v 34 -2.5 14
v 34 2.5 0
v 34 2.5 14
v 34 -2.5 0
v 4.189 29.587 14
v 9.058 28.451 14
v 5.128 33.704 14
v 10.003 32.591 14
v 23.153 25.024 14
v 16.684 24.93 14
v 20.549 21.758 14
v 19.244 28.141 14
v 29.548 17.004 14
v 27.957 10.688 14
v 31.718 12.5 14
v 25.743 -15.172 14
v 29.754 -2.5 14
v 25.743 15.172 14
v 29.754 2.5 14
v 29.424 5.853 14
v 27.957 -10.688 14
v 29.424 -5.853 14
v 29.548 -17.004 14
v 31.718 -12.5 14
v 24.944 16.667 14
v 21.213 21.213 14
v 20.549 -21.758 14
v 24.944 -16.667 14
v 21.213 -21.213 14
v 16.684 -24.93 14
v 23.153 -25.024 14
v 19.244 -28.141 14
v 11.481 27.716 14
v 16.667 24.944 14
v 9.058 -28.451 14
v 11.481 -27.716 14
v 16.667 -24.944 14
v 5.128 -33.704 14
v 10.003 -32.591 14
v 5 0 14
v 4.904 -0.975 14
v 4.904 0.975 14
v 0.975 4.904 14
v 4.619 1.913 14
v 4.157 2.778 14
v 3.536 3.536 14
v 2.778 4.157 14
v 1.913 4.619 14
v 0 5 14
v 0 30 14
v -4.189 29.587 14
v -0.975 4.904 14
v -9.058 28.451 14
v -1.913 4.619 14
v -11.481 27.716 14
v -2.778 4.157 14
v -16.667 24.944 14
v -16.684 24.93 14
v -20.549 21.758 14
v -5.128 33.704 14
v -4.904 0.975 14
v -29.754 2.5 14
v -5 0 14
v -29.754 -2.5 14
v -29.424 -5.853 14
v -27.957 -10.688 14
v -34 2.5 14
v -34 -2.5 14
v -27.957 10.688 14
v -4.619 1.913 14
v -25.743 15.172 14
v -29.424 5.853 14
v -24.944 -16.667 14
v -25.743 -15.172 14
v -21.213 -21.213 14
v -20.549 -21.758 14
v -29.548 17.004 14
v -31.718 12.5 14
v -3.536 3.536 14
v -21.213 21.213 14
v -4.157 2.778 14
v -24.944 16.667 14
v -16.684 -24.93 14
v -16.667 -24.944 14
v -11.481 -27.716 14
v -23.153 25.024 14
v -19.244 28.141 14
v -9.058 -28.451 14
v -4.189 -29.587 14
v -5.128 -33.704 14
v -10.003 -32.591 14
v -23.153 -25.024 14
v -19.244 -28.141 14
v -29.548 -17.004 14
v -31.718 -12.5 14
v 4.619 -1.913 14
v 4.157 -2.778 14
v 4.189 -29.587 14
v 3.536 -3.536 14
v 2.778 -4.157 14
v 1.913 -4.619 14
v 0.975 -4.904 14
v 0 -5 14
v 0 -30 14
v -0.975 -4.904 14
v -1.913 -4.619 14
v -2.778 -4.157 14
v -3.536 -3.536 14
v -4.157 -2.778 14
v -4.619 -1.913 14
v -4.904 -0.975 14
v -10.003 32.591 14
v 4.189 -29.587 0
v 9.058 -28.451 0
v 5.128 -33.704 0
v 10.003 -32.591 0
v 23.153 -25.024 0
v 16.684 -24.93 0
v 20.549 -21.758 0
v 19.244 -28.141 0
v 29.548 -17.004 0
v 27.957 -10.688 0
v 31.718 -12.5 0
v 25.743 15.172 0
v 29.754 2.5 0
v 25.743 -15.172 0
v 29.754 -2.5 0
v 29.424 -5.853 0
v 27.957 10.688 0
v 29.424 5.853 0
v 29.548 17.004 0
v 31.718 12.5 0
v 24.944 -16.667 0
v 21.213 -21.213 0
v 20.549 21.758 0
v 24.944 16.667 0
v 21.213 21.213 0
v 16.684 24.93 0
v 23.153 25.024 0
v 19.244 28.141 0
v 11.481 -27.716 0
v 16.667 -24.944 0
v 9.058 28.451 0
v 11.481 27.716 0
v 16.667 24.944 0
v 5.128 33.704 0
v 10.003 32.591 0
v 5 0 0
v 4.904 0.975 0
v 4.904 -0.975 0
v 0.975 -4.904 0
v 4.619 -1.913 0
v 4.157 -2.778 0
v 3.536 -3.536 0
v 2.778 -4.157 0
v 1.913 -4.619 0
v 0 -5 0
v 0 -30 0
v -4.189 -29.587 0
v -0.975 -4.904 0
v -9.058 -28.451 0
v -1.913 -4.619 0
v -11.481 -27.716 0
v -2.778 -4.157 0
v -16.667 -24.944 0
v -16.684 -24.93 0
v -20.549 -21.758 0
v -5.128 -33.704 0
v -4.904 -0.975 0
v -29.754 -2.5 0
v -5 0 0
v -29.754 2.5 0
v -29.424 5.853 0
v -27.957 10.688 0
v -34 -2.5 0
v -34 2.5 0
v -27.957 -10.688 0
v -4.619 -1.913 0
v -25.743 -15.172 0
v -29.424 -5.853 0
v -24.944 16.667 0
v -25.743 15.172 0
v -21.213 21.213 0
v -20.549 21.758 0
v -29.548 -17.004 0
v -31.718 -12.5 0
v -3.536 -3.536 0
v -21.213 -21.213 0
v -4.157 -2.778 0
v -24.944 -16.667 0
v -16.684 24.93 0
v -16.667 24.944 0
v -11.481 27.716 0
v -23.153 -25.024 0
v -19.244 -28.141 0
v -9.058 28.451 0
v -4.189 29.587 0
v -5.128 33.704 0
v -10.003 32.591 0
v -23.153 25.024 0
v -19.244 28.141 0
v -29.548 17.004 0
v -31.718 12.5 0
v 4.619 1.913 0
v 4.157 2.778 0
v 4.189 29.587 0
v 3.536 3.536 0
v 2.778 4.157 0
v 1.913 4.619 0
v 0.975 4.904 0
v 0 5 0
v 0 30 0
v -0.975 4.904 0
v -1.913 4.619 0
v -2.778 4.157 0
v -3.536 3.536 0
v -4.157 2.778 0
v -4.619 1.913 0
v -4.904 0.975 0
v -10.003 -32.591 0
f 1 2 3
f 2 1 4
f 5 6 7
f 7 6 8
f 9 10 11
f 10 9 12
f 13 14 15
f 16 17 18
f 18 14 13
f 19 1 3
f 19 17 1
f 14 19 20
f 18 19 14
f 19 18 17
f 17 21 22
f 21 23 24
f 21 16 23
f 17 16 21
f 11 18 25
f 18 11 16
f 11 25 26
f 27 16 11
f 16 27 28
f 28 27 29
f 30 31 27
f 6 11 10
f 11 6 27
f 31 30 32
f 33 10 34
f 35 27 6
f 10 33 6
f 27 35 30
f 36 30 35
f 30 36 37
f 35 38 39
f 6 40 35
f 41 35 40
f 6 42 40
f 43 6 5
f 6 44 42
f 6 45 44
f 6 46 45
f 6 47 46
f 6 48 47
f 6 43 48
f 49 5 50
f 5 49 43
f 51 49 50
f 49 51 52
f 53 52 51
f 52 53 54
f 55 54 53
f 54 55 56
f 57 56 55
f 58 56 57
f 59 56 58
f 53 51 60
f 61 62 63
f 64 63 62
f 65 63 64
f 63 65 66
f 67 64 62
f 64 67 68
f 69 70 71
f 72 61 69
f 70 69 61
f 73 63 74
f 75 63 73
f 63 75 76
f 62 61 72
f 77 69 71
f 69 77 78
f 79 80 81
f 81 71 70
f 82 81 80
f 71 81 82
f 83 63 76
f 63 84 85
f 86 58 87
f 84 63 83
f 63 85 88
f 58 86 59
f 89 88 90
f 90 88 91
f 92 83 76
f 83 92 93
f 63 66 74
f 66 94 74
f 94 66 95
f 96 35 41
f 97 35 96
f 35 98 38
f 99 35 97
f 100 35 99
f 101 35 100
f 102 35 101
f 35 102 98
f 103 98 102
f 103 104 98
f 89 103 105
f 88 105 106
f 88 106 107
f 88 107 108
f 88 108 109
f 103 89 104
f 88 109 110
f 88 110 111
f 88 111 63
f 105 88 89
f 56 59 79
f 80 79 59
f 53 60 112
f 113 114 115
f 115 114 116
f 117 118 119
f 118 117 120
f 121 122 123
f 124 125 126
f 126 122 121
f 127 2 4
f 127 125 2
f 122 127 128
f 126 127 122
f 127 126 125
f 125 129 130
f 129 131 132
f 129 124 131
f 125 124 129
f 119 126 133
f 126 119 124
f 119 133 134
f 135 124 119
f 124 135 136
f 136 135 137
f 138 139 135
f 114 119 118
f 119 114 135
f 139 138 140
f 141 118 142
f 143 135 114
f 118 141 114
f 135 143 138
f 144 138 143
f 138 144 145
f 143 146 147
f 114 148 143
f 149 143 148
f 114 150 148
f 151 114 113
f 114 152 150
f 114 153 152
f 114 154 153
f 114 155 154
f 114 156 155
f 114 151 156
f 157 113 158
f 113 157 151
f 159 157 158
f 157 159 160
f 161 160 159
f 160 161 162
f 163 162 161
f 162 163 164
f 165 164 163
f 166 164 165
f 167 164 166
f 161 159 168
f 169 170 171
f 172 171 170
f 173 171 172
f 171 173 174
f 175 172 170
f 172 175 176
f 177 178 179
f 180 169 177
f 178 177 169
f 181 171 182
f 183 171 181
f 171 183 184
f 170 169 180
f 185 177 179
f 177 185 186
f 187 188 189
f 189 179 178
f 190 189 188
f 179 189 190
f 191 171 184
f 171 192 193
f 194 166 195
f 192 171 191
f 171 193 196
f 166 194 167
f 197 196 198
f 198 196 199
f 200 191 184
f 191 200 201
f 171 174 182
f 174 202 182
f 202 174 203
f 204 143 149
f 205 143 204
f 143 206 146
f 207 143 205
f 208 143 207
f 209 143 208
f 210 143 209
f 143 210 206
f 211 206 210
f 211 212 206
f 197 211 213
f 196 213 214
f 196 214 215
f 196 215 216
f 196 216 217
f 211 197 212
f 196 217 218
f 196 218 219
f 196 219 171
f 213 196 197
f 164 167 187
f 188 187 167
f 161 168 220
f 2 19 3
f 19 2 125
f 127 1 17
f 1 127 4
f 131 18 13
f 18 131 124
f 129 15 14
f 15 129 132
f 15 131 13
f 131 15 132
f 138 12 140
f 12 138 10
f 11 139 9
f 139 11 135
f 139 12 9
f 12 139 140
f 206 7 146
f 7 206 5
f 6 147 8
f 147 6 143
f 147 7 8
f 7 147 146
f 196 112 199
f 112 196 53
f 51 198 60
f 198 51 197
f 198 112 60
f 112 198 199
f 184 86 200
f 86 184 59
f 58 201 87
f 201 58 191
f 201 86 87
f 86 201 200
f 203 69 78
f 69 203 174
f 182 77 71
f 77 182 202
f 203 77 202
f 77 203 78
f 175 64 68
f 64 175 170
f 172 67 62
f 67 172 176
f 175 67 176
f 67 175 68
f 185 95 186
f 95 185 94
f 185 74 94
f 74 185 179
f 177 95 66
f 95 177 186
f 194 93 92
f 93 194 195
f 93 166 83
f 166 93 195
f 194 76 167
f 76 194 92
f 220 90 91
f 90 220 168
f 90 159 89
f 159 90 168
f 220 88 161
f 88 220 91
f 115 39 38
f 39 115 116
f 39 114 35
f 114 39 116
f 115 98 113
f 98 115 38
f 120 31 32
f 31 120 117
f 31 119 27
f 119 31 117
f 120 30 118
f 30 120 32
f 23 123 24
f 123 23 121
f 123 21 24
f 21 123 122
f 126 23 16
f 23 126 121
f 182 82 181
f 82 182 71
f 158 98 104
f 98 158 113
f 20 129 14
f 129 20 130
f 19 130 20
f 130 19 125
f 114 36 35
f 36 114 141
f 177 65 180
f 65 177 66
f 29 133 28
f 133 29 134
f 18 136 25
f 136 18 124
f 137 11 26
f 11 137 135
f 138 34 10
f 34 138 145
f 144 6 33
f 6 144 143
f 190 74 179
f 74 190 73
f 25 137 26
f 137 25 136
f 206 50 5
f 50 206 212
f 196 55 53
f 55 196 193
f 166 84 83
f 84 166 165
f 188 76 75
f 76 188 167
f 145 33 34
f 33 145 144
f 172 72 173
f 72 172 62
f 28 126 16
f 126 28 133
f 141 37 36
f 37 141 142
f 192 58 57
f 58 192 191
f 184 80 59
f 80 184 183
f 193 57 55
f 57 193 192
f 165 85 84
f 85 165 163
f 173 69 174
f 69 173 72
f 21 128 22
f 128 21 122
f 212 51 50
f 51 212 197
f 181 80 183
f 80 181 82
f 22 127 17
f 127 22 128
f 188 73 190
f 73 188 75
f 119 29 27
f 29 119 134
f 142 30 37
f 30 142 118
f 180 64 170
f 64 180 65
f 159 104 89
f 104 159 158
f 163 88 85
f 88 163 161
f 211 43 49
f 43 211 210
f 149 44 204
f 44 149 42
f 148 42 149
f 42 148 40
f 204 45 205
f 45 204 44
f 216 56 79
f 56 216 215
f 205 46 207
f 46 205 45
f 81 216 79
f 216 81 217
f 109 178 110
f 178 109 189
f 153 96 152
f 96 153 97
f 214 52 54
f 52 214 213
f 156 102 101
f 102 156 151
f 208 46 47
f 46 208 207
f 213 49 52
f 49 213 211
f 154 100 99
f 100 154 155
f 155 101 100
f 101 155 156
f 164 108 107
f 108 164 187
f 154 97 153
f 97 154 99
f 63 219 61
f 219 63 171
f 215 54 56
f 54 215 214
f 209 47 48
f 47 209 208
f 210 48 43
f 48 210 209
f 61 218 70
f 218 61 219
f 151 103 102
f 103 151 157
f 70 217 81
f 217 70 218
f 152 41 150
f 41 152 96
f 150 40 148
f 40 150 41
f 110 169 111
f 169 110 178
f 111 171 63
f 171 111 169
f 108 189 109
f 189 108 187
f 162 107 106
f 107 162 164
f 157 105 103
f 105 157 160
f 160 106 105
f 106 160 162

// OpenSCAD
$fn = 32;

// ----------------------------------------------------------------------
// Spur blank: bored gear blank
// ----------------------------------------------------------------------

// --- parameters (mm) ---
disc_r = 30;              // blank root radius
disc_t = 14;              // blank thickness
n_teeth = 14;             // stub tooth count
tooth_w = 5;              // tooth width at the root
tooth_h = 4;              // tooth height above the root
bore_r = 5;               // central bore radius

out_r = disc_r + tooth_h;  // tip radius
bbox_x = 68.0;  // measured width over the teeth
bbox_y = 67.41;  // measured depth over the teeth

difference() {
union() {
  cylinder(r = disc_r, h = disc_t);
  for (i = [0 : n_teeth - 1])
    rotate([0, 0, i * 360 / n_teeth])
      translate([disc_r - 1, -tooth_w / 2, 0])
        cube([tooth_h + 1, tooth_w, disc_t]);
}
  translate([0, 0, -1]) cylinder(r = bore_r, h = disc_t + 2);
}
